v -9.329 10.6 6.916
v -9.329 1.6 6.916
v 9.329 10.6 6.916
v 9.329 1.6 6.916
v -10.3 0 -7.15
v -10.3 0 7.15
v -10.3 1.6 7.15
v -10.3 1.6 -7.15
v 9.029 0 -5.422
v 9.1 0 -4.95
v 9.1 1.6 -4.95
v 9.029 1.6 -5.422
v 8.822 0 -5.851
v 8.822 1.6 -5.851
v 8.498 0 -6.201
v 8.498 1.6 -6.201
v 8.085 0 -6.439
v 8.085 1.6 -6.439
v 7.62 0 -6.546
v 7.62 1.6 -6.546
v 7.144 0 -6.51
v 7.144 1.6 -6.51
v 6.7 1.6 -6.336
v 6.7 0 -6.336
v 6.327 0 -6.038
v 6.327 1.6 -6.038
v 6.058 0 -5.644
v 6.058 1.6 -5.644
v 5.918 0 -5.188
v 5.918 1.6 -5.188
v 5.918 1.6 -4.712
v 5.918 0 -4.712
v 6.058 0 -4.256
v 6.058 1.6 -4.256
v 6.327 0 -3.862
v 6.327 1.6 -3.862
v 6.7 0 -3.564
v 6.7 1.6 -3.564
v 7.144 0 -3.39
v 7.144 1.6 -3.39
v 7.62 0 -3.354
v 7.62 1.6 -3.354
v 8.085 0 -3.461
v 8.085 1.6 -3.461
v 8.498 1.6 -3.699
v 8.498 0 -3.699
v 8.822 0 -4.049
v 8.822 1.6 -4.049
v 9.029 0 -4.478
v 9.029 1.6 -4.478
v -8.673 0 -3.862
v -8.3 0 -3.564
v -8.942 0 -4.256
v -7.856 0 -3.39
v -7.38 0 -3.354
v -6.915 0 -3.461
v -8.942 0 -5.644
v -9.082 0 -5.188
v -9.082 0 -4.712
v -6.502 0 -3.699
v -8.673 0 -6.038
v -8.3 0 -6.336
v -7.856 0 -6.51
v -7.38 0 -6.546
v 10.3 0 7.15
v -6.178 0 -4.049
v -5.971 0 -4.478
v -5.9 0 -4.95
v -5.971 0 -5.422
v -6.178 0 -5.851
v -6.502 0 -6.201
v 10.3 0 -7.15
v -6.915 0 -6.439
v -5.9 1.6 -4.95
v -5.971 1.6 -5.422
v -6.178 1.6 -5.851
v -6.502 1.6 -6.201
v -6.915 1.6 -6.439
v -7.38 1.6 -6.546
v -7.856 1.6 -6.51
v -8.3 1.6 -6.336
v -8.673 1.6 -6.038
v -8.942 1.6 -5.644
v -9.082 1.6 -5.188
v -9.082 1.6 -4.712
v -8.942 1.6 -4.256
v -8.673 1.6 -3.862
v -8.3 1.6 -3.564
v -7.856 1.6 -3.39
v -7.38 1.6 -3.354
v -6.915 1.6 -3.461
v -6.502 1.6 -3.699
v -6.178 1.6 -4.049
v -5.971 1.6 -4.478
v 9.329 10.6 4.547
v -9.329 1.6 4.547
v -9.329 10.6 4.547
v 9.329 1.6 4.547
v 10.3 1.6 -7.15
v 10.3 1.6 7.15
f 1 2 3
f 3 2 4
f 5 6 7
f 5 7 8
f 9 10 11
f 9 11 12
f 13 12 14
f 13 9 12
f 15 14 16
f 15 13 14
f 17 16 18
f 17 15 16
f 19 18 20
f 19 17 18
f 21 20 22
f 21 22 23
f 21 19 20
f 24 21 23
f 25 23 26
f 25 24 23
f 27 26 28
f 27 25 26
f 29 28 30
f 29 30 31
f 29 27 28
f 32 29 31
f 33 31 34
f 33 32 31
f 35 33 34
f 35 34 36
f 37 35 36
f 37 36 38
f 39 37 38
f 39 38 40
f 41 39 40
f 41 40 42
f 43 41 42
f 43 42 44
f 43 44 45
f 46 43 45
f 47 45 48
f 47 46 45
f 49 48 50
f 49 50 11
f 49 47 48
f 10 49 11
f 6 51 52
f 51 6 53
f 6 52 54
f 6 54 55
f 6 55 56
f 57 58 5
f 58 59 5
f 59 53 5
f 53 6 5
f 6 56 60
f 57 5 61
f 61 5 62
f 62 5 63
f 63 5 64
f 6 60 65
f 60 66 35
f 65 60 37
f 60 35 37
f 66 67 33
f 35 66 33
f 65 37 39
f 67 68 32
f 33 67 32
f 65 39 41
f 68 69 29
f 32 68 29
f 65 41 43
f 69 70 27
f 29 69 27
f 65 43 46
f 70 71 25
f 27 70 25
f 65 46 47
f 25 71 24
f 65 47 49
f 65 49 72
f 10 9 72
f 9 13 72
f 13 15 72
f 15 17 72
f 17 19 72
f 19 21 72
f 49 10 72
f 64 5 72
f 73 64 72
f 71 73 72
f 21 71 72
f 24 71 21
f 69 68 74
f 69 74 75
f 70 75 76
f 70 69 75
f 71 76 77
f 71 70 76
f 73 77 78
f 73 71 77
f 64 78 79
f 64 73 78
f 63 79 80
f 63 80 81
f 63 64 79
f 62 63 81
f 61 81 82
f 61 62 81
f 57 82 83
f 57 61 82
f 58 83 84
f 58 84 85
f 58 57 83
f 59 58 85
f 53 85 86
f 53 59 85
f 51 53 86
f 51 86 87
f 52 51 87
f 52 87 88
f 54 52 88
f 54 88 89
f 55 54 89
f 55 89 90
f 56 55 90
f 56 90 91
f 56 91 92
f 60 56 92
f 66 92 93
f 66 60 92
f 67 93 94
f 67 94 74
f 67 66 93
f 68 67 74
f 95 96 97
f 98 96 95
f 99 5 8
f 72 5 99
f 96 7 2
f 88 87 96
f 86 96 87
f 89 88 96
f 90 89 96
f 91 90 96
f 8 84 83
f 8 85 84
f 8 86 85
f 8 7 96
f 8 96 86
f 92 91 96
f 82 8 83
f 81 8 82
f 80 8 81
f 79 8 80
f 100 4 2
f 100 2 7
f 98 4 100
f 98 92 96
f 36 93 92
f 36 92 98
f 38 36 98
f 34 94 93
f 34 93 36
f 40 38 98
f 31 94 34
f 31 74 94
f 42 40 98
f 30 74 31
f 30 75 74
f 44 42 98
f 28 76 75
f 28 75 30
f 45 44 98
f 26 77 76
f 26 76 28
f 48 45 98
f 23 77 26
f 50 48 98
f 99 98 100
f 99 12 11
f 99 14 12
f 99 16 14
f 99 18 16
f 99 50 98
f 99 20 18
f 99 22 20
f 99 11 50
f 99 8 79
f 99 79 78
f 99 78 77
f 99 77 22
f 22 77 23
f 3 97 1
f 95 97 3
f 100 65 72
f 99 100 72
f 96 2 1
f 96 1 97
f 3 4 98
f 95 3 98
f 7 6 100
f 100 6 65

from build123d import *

# Parameters (mm, degrees)
SKETCH1_W           = 20.6
SKETCH1_H           = 14.3
SKETCH1_R           = 1.6
BOSS_EXTRUDE1_DEPTH = 1.6
SKETCH2_W           = 18.658076696
SKETCH2_H           = 2.368570216
BOSS_EXTRUDE2_DEPTH = 9


with BuildPart() as part:
    # Sketch1 → Boss-Extrude1 (new body)
    with BuildSketch(Plane(origin=(0, 0, 0), x_dir=(1, 0, 0), z_dir=(0, 1, 0))):
        Rectangle(SKETCH1_W, SKETCH1_H)
        with Locations((-7.5, 4.95)):
            Circle(SKETCH1_R, mode=Mode.SUBTRACT)
        with Locations((7.5, 4.95)):
            Circle(SKETCH1_R, mode=Mode.SUBTRACT)
    extrude(amount=BOSS_EXTRUDE1_DEPTH)

    # Sketch2 → Boss-Extrude2 (add)
    with BuildSketch(Plane(origin=(0, 1.6, 0), x_dir=(1, 0, 0), z_dir=(0, 1, 0))):
        with Locations((0, -5.731493021)):
            Rectangle(SKETCH2_W, SKETCH2_H)
    extrude(amount=BOSS_EXTRUDE2_DEPTH)


solid = part.part
